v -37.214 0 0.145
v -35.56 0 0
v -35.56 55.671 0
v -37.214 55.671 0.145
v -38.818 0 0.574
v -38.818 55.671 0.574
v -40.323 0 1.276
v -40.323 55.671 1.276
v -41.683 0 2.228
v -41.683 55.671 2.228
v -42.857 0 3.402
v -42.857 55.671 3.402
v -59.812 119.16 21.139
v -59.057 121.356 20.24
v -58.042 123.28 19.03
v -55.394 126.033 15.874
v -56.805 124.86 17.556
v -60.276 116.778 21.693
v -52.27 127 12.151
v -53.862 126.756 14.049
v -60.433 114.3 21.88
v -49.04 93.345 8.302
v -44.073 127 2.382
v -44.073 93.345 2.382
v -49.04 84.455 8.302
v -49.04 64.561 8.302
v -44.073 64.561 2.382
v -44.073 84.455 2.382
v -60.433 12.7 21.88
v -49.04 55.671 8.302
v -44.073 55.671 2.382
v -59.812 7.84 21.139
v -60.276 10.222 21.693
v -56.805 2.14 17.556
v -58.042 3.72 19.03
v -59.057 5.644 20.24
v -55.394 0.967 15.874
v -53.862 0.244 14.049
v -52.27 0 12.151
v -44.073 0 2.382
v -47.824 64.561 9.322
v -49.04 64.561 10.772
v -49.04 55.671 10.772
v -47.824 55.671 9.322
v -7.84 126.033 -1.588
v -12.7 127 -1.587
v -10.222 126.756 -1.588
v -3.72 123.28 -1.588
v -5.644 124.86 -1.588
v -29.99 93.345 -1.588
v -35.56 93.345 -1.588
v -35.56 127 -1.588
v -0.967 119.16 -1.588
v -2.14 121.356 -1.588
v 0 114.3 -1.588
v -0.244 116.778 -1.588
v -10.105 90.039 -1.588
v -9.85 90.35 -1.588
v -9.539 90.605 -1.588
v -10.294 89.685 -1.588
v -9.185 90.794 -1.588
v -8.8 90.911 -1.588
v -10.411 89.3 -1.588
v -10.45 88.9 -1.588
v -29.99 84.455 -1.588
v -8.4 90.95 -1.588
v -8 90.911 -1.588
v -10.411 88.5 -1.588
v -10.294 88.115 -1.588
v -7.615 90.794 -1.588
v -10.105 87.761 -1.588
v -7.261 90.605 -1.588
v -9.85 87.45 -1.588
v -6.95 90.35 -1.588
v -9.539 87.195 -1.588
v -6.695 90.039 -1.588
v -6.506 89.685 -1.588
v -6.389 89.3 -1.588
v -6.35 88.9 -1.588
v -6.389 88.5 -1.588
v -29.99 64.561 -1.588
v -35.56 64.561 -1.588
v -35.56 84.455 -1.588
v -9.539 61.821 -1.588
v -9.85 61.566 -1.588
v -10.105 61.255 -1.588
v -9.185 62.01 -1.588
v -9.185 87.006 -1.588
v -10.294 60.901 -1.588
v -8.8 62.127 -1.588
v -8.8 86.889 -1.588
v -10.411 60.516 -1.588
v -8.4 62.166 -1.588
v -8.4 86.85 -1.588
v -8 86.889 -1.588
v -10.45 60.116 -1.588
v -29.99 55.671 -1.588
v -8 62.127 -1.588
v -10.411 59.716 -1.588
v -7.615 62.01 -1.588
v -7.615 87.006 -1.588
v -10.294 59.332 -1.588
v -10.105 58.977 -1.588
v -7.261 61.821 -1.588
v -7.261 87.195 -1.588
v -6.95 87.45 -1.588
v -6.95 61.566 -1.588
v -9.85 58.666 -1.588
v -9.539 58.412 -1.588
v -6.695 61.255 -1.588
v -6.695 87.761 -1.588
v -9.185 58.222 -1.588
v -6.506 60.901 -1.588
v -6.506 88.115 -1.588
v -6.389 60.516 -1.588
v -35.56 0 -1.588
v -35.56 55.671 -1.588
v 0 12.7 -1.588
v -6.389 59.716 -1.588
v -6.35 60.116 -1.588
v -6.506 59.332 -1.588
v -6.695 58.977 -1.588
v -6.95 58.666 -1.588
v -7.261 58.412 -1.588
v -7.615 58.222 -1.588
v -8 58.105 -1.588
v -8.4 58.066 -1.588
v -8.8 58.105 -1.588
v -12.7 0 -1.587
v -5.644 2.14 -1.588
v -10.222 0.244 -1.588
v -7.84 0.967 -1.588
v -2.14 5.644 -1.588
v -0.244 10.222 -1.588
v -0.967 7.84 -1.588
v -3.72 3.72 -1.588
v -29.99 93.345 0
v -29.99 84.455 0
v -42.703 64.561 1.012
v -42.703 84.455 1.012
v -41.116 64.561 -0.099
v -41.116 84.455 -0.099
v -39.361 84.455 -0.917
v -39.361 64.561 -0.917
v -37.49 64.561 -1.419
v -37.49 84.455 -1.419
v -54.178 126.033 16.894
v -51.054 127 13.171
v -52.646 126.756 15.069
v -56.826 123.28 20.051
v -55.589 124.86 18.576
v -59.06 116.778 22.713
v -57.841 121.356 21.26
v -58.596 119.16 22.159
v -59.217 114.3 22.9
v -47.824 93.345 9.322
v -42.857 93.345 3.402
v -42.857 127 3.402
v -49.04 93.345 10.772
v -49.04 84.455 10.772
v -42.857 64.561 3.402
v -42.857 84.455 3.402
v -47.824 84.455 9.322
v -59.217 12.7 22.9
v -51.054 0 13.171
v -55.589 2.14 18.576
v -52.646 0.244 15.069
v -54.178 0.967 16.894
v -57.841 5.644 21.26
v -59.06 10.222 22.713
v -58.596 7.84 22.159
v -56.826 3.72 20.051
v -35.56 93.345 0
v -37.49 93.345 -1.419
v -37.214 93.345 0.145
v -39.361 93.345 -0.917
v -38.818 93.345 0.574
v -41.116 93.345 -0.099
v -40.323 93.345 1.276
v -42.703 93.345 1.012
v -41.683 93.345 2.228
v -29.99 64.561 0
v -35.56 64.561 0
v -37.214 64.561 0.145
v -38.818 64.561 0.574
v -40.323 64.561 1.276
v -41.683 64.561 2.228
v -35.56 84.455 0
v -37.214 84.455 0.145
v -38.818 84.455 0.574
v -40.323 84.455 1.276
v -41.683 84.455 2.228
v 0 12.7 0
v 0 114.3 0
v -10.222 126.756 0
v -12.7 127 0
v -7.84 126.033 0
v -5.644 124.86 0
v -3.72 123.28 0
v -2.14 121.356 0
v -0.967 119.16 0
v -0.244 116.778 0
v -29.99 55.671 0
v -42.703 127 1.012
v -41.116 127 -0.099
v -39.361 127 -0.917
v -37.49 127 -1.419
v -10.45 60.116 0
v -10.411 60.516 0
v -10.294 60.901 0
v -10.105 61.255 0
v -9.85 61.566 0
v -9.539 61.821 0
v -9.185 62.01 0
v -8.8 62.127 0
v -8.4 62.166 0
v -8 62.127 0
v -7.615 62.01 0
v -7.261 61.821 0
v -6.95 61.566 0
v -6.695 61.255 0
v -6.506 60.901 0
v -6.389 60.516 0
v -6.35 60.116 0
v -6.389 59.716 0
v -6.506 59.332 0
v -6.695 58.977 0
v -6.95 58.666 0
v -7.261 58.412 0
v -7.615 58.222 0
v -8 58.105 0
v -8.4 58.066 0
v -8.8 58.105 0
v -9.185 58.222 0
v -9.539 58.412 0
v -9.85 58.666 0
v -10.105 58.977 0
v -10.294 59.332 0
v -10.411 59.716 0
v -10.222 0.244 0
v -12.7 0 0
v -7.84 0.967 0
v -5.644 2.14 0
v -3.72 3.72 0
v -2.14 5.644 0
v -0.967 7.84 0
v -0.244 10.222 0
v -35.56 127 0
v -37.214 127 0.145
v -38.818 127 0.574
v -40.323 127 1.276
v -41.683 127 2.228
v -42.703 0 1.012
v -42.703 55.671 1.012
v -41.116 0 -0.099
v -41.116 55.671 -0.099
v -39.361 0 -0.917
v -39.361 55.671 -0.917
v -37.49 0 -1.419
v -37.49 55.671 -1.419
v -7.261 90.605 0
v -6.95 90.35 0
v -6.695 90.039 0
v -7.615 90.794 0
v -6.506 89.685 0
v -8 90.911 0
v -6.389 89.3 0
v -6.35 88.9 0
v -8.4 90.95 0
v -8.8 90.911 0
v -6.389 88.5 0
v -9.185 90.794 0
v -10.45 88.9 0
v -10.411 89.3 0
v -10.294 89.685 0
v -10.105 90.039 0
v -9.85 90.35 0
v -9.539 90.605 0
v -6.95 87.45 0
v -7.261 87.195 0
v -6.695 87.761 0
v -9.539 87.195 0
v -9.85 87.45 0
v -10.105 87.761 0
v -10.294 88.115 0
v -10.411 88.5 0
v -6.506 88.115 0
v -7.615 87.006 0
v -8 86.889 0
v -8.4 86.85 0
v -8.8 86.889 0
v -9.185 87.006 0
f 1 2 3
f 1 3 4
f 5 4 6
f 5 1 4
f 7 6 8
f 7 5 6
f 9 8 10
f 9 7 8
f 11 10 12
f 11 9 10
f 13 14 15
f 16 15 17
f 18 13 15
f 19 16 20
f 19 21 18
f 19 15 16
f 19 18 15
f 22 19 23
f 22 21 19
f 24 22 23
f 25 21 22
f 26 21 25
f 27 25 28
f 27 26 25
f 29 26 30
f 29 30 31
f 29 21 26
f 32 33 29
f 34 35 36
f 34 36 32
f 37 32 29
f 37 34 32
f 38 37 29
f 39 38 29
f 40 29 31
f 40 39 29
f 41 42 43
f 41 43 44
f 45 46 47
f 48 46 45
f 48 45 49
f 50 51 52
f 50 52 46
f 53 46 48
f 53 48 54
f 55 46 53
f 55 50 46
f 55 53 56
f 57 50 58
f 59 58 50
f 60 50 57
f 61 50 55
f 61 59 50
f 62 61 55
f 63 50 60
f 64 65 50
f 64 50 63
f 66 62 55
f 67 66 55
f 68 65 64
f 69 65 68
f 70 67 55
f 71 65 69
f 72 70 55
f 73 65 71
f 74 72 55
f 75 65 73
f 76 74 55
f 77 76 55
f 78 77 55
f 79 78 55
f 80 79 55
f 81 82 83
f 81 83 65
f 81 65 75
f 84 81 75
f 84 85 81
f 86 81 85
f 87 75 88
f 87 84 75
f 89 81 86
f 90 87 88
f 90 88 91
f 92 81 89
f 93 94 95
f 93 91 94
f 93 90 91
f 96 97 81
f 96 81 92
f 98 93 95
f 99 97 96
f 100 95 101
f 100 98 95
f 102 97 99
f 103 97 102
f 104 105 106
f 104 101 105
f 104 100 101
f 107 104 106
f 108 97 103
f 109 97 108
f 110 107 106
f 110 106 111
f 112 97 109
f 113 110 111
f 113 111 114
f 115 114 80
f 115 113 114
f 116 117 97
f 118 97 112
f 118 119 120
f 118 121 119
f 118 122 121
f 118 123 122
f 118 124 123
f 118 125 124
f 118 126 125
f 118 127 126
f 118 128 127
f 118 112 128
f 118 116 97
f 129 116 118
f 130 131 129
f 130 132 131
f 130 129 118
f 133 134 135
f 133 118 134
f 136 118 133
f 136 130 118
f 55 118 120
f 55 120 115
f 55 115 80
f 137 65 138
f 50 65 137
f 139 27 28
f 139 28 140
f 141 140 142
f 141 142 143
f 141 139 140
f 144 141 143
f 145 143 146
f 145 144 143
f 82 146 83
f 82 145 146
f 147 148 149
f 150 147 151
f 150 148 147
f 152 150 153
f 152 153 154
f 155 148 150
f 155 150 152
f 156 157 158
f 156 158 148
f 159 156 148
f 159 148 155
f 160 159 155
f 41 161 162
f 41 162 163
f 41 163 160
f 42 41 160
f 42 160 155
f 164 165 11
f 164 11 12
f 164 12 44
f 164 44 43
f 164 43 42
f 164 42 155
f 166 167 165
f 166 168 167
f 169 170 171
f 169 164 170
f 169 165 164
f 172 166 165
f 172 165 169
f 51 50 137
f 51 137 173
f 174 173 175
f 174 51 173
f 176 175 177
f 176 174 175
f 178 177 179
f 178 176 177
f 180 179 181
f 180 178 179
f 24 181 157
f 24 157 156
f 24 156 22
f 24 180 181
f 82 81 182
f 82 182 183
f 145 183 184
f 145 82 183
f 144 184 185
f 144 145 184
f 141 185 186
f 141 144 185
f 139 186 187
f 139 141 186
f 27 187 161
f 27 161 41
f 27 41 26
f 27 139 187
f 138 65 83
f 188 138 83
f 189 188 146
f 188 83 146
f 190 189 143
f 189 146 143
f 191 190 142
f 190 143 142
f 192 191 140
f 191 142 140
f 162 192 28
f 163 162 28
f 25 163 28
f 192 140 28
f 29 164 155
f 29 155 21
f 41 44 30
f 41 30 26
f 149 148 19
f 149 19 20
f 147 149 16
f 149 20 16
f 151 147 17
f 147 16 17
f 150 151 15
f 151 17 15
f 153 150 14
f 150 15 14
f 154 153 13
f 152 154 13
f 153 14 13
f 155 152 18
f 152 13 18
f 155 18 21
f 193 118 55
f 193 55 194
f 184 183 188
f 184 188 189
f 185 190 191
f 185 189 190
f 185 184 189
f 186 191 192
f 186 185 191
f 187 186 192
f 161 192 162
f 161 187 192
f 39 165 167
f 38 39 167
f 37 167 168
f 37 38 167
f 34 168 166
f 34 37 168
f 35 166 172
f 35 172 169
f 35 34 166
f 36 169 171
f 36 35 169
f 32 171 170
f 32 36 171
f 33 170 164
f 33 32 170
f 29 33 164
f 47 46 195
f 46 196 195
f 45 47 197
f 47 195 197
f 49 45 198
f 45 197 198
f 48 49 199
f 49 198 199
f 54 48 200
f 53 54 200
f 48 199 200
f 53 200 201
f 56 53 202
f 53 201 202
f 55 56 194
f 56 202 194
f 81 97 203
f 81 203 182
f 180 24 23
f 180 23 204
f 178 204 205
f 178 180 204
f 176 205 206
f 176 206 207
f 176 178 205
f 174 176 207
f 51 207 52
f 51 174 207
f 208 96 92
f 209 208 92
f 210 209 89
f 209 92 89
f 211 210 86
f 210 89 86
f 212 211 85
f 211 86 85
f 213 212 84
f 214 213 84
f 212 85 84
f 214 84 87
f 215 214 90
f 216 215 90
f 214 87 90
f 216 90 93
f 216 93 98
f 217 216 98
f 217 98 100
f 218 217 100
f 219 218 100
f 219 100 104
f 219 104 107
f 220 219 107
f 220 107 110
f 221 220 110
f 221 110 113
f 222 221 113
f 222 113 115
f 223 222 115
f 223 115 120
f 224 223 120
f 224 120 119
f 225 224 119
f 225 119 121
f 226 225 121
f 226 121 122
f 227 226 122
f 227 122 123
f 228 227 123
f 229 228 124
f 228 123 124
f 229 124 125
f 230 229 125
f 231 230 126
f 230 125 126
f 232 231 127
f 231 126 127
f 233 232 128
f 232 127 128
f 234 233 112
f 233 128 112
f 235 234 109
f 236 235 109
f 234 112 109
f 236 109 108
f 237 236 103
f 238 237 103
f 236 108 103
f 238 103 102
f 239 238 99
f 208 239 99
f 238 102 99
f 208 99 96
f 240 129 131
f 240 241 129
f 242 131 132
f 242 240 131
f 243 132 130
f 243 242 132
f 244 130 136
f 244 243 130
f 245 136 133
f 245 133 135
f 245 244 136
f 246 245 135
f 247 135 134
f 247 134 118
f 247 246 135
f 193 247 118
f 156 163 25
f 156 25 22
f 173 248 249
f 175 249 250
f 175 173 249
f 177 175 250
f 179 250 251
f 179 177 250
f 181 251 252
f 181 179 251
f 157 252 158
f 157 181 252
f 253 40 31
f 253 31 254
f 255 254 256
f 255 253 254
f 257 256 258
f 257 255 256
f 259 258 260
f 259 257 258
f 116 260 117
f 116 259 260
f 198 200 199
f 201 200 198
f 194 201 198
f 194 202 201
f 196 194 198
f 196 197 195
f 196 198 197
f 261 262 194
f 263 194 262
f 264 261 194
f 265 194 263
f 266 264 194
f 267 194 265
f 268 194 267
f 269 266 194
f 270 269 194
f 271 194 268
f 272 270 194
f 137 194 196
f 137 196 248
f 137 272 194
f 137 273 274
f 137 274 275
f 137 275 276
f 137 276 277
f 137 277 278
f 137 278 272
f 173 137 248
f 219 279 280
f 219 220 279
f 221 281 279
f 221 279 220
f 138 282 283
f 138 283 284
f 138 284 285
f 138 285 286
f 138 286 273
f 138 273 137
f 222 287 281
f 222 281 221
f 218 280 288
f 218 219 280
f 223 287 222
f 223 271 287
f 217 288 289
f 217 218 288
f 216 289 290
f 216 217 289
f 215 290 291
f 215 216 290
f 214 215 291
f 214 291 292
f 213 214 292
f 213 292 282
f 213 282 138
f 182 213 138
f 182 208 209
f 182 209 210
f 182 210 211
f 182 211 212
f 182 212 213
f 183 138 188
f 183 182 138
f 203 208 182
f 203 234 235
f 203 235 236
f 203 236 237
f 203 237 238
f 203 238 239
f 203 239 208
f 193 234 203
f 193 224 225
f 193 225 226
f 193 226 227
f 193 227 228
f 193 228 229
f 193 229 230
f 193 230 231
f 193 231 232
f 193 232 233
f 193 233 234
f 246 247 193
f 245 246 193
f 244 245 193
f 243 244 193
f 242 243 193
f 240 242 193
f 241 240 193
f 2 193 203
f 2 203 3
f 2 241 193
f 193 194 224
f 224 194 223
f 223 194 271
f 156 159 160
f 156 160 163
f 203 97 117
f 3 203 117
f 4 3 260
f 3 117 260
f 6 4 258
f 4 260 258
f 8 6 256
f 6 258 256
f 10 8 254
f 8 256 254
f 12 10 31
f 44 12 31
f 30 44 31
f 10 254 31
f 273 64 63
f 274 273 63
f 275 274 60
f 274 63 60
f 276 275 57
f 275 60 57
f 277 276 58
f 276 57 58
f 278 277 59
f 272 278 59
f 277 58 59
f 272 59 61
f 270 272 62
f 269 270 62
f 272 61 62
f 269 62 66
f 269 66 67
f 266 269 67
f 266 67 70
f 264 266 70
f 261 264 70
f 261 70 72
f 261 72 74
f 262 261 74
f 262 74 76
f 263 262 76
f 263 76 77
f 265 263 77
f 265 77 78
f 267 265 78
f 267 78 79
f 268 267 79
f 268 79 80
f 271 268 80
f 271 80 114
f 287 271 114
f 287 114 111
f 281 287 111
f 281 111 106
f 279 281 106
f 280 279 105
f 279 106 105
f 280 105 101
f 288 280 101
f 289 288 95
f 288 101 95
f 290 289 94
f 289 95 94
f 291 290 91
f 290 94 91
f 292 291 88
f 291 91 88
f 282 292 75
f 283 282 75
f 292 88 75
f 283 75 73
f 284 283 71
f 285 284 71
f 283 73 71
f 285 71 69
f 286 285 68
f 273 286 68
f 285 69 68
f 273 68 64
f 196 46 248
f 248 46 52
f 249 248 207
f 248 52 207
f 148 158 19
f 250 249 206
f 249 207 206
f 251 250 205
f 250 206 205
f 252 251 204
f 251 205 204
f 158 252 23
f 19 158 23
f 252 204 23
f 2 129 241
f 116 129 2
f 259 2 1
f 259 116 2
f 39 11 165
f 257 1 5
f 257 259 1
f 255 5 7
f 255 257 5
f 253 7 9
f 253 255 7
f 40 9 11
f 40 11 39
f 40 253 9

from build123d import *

# Parameters (mm, degrees)
BOSS_EXTRUDE1_DEPTH = 127
SKETCH2_R           = 2.049999964
SKETCH2_W           = 19.05
SKETCH2_H           = 8.89
CUT_EXTRUDE1_DEPTH  = 25.48749992
FILLET1_R           = 12.7
BOSS_EXTRUDE2_REACH = 18.672
SKETCH4_W           = 1.891908828
SKETCH4_H           = 8.89


with BuildPart() as part:
    # Sketch1 → Boss-Extrude1 (new body)
    with BuildSketch(Plane(origin=(0, 0, 0), x_dir=(1, 0, 0), z_dir=(0, 1, 0))):
        with BuildLine():
            Line((0, 0), (-35.56, 0))
            ThreePointArc((-35.56, 0), (-39.585438943, -0.892418328), (-42.856573321, -3.402448018))
            Line((-42.856573321, -3.402448018), (-59.216961931, -22.89999992))
            Line((-59.216961931, -22.89999992), (-60.433057484, -21.87957459))
            Line((-60.433057484, -21.87957459), (-44.072668874, -2.382022687))
            ThreePointArc((-44.072668874, -2.382022687), (-40.256345434, 0.546345283), (-35.56, 1.5875))
            Line((-35.56, 1.5875), (0, 1.5875))
            Line((0, 1.5875), (0, 0))
        make_face()
    extrude(amount=BOSS_EXTRUDE1_DEPTH)

    # Sketch2 → Cut-Extrude1 (cut, through all)
    with BuildSketch(Plane(origin=(0, 0, -1.5875), x_dir=(-1, 0, 0), z_dir=(0, 0, -1))):
        with Locations((8.399999964, 88.9)):
            Circle(SKETCH2_R)
        with Locations((8.399999964, 60.116067728)):
            Circle(SKETCH2_R)
        with Locations((39.514999964, 88.9)):
            Rectangle(SKETCH2_W, SKETCH2_H)
        with Locations((39.514999964, 60.116067728)):
            Rectangle(SKETCH2_W, SKETCH2_H)
    extrude(amount=-CUT_EXTRUDE1_DEPTH, mode=Mode.SUBTRACT)

    # Fillet1
    fillet1_edges = [part.edges().sort_by_distance(p)[0] for p in [
        (0, 0, -0.79375),
        (-59.825009707, 127, 22.389787255),
        (0, 127, -0.79375),
        (-59.825009707, 0, 22.389787255),
    ]]
    fillet(fillet1_edges, radius=FILLET1_R)

    # Boss-Extrude2: up to this face of the body (flat: up to its plane)
    boss_extrude2_end = Plane(part.part.faces().sort_by_distance((-49.039999964, 88.9, 9.536713147))[0])
    # Sketch4 → Boss-Extrude2 (add, up to the picked face)
    with BuildSketch(Plane(origin=(-23.473890996, 0, -19.696933277), x_dir=(0.64278761, 0, -0.766044443), z_dir=(0.766044443, 0, 0.64278761)), mode=Mode.PRIVATE) as boss_extrude2_sk1:
        with Locations((-38.827850468, 88.9)):
            Rectangle(SKETCH4_W, SKETCH4_H)
    boss_extrude2_tool1 = split(extrude(boss_extrude2_sk1.sketch, amount=-BOSS_EXTRUDE2_REACH, mode=Mode.PRIVATE), bisect_by=boss_extrude2_end, keep=Keep.BOTH, mode=Mode.PRIVATE)
    add(boss_extrude2_tool1.solids().sort_by_distance((-48.431952, 88.9, 10.046926))[0])
    # Sketch4 → Boss-Extrude2 (add, up to the picked face)
    with BuildSketch(Plane(origin=(-23.473890996, 0, -19.696933277), x_dir=(0.64278761, 0, -0.766044443), z_dir=(0.766044443, 0, 0.64278761)), mode=Mode.PRIVATE) as boss_extrude2_sk2:
        with Locations((-38.827850468, 60.116067728)):
            Rectangle(SKETCH4_W, SKETCH4_H)
    boss_extrude2_tool2 = split(extrude(boss_extrude2_sk2.sketch, amount=-BOSS_EXTRUDE2_REACH, mode=Mode.PRIVATE), bisect_by=boss_extrude2_end, keep=Keep.BOTH, mode=Mode.PRIVATE)
    add(boss_extrude2_tool2.solids().sort_by_distance((-48.431952, 60.116068, 10.046926))[0])


solid = part.part
